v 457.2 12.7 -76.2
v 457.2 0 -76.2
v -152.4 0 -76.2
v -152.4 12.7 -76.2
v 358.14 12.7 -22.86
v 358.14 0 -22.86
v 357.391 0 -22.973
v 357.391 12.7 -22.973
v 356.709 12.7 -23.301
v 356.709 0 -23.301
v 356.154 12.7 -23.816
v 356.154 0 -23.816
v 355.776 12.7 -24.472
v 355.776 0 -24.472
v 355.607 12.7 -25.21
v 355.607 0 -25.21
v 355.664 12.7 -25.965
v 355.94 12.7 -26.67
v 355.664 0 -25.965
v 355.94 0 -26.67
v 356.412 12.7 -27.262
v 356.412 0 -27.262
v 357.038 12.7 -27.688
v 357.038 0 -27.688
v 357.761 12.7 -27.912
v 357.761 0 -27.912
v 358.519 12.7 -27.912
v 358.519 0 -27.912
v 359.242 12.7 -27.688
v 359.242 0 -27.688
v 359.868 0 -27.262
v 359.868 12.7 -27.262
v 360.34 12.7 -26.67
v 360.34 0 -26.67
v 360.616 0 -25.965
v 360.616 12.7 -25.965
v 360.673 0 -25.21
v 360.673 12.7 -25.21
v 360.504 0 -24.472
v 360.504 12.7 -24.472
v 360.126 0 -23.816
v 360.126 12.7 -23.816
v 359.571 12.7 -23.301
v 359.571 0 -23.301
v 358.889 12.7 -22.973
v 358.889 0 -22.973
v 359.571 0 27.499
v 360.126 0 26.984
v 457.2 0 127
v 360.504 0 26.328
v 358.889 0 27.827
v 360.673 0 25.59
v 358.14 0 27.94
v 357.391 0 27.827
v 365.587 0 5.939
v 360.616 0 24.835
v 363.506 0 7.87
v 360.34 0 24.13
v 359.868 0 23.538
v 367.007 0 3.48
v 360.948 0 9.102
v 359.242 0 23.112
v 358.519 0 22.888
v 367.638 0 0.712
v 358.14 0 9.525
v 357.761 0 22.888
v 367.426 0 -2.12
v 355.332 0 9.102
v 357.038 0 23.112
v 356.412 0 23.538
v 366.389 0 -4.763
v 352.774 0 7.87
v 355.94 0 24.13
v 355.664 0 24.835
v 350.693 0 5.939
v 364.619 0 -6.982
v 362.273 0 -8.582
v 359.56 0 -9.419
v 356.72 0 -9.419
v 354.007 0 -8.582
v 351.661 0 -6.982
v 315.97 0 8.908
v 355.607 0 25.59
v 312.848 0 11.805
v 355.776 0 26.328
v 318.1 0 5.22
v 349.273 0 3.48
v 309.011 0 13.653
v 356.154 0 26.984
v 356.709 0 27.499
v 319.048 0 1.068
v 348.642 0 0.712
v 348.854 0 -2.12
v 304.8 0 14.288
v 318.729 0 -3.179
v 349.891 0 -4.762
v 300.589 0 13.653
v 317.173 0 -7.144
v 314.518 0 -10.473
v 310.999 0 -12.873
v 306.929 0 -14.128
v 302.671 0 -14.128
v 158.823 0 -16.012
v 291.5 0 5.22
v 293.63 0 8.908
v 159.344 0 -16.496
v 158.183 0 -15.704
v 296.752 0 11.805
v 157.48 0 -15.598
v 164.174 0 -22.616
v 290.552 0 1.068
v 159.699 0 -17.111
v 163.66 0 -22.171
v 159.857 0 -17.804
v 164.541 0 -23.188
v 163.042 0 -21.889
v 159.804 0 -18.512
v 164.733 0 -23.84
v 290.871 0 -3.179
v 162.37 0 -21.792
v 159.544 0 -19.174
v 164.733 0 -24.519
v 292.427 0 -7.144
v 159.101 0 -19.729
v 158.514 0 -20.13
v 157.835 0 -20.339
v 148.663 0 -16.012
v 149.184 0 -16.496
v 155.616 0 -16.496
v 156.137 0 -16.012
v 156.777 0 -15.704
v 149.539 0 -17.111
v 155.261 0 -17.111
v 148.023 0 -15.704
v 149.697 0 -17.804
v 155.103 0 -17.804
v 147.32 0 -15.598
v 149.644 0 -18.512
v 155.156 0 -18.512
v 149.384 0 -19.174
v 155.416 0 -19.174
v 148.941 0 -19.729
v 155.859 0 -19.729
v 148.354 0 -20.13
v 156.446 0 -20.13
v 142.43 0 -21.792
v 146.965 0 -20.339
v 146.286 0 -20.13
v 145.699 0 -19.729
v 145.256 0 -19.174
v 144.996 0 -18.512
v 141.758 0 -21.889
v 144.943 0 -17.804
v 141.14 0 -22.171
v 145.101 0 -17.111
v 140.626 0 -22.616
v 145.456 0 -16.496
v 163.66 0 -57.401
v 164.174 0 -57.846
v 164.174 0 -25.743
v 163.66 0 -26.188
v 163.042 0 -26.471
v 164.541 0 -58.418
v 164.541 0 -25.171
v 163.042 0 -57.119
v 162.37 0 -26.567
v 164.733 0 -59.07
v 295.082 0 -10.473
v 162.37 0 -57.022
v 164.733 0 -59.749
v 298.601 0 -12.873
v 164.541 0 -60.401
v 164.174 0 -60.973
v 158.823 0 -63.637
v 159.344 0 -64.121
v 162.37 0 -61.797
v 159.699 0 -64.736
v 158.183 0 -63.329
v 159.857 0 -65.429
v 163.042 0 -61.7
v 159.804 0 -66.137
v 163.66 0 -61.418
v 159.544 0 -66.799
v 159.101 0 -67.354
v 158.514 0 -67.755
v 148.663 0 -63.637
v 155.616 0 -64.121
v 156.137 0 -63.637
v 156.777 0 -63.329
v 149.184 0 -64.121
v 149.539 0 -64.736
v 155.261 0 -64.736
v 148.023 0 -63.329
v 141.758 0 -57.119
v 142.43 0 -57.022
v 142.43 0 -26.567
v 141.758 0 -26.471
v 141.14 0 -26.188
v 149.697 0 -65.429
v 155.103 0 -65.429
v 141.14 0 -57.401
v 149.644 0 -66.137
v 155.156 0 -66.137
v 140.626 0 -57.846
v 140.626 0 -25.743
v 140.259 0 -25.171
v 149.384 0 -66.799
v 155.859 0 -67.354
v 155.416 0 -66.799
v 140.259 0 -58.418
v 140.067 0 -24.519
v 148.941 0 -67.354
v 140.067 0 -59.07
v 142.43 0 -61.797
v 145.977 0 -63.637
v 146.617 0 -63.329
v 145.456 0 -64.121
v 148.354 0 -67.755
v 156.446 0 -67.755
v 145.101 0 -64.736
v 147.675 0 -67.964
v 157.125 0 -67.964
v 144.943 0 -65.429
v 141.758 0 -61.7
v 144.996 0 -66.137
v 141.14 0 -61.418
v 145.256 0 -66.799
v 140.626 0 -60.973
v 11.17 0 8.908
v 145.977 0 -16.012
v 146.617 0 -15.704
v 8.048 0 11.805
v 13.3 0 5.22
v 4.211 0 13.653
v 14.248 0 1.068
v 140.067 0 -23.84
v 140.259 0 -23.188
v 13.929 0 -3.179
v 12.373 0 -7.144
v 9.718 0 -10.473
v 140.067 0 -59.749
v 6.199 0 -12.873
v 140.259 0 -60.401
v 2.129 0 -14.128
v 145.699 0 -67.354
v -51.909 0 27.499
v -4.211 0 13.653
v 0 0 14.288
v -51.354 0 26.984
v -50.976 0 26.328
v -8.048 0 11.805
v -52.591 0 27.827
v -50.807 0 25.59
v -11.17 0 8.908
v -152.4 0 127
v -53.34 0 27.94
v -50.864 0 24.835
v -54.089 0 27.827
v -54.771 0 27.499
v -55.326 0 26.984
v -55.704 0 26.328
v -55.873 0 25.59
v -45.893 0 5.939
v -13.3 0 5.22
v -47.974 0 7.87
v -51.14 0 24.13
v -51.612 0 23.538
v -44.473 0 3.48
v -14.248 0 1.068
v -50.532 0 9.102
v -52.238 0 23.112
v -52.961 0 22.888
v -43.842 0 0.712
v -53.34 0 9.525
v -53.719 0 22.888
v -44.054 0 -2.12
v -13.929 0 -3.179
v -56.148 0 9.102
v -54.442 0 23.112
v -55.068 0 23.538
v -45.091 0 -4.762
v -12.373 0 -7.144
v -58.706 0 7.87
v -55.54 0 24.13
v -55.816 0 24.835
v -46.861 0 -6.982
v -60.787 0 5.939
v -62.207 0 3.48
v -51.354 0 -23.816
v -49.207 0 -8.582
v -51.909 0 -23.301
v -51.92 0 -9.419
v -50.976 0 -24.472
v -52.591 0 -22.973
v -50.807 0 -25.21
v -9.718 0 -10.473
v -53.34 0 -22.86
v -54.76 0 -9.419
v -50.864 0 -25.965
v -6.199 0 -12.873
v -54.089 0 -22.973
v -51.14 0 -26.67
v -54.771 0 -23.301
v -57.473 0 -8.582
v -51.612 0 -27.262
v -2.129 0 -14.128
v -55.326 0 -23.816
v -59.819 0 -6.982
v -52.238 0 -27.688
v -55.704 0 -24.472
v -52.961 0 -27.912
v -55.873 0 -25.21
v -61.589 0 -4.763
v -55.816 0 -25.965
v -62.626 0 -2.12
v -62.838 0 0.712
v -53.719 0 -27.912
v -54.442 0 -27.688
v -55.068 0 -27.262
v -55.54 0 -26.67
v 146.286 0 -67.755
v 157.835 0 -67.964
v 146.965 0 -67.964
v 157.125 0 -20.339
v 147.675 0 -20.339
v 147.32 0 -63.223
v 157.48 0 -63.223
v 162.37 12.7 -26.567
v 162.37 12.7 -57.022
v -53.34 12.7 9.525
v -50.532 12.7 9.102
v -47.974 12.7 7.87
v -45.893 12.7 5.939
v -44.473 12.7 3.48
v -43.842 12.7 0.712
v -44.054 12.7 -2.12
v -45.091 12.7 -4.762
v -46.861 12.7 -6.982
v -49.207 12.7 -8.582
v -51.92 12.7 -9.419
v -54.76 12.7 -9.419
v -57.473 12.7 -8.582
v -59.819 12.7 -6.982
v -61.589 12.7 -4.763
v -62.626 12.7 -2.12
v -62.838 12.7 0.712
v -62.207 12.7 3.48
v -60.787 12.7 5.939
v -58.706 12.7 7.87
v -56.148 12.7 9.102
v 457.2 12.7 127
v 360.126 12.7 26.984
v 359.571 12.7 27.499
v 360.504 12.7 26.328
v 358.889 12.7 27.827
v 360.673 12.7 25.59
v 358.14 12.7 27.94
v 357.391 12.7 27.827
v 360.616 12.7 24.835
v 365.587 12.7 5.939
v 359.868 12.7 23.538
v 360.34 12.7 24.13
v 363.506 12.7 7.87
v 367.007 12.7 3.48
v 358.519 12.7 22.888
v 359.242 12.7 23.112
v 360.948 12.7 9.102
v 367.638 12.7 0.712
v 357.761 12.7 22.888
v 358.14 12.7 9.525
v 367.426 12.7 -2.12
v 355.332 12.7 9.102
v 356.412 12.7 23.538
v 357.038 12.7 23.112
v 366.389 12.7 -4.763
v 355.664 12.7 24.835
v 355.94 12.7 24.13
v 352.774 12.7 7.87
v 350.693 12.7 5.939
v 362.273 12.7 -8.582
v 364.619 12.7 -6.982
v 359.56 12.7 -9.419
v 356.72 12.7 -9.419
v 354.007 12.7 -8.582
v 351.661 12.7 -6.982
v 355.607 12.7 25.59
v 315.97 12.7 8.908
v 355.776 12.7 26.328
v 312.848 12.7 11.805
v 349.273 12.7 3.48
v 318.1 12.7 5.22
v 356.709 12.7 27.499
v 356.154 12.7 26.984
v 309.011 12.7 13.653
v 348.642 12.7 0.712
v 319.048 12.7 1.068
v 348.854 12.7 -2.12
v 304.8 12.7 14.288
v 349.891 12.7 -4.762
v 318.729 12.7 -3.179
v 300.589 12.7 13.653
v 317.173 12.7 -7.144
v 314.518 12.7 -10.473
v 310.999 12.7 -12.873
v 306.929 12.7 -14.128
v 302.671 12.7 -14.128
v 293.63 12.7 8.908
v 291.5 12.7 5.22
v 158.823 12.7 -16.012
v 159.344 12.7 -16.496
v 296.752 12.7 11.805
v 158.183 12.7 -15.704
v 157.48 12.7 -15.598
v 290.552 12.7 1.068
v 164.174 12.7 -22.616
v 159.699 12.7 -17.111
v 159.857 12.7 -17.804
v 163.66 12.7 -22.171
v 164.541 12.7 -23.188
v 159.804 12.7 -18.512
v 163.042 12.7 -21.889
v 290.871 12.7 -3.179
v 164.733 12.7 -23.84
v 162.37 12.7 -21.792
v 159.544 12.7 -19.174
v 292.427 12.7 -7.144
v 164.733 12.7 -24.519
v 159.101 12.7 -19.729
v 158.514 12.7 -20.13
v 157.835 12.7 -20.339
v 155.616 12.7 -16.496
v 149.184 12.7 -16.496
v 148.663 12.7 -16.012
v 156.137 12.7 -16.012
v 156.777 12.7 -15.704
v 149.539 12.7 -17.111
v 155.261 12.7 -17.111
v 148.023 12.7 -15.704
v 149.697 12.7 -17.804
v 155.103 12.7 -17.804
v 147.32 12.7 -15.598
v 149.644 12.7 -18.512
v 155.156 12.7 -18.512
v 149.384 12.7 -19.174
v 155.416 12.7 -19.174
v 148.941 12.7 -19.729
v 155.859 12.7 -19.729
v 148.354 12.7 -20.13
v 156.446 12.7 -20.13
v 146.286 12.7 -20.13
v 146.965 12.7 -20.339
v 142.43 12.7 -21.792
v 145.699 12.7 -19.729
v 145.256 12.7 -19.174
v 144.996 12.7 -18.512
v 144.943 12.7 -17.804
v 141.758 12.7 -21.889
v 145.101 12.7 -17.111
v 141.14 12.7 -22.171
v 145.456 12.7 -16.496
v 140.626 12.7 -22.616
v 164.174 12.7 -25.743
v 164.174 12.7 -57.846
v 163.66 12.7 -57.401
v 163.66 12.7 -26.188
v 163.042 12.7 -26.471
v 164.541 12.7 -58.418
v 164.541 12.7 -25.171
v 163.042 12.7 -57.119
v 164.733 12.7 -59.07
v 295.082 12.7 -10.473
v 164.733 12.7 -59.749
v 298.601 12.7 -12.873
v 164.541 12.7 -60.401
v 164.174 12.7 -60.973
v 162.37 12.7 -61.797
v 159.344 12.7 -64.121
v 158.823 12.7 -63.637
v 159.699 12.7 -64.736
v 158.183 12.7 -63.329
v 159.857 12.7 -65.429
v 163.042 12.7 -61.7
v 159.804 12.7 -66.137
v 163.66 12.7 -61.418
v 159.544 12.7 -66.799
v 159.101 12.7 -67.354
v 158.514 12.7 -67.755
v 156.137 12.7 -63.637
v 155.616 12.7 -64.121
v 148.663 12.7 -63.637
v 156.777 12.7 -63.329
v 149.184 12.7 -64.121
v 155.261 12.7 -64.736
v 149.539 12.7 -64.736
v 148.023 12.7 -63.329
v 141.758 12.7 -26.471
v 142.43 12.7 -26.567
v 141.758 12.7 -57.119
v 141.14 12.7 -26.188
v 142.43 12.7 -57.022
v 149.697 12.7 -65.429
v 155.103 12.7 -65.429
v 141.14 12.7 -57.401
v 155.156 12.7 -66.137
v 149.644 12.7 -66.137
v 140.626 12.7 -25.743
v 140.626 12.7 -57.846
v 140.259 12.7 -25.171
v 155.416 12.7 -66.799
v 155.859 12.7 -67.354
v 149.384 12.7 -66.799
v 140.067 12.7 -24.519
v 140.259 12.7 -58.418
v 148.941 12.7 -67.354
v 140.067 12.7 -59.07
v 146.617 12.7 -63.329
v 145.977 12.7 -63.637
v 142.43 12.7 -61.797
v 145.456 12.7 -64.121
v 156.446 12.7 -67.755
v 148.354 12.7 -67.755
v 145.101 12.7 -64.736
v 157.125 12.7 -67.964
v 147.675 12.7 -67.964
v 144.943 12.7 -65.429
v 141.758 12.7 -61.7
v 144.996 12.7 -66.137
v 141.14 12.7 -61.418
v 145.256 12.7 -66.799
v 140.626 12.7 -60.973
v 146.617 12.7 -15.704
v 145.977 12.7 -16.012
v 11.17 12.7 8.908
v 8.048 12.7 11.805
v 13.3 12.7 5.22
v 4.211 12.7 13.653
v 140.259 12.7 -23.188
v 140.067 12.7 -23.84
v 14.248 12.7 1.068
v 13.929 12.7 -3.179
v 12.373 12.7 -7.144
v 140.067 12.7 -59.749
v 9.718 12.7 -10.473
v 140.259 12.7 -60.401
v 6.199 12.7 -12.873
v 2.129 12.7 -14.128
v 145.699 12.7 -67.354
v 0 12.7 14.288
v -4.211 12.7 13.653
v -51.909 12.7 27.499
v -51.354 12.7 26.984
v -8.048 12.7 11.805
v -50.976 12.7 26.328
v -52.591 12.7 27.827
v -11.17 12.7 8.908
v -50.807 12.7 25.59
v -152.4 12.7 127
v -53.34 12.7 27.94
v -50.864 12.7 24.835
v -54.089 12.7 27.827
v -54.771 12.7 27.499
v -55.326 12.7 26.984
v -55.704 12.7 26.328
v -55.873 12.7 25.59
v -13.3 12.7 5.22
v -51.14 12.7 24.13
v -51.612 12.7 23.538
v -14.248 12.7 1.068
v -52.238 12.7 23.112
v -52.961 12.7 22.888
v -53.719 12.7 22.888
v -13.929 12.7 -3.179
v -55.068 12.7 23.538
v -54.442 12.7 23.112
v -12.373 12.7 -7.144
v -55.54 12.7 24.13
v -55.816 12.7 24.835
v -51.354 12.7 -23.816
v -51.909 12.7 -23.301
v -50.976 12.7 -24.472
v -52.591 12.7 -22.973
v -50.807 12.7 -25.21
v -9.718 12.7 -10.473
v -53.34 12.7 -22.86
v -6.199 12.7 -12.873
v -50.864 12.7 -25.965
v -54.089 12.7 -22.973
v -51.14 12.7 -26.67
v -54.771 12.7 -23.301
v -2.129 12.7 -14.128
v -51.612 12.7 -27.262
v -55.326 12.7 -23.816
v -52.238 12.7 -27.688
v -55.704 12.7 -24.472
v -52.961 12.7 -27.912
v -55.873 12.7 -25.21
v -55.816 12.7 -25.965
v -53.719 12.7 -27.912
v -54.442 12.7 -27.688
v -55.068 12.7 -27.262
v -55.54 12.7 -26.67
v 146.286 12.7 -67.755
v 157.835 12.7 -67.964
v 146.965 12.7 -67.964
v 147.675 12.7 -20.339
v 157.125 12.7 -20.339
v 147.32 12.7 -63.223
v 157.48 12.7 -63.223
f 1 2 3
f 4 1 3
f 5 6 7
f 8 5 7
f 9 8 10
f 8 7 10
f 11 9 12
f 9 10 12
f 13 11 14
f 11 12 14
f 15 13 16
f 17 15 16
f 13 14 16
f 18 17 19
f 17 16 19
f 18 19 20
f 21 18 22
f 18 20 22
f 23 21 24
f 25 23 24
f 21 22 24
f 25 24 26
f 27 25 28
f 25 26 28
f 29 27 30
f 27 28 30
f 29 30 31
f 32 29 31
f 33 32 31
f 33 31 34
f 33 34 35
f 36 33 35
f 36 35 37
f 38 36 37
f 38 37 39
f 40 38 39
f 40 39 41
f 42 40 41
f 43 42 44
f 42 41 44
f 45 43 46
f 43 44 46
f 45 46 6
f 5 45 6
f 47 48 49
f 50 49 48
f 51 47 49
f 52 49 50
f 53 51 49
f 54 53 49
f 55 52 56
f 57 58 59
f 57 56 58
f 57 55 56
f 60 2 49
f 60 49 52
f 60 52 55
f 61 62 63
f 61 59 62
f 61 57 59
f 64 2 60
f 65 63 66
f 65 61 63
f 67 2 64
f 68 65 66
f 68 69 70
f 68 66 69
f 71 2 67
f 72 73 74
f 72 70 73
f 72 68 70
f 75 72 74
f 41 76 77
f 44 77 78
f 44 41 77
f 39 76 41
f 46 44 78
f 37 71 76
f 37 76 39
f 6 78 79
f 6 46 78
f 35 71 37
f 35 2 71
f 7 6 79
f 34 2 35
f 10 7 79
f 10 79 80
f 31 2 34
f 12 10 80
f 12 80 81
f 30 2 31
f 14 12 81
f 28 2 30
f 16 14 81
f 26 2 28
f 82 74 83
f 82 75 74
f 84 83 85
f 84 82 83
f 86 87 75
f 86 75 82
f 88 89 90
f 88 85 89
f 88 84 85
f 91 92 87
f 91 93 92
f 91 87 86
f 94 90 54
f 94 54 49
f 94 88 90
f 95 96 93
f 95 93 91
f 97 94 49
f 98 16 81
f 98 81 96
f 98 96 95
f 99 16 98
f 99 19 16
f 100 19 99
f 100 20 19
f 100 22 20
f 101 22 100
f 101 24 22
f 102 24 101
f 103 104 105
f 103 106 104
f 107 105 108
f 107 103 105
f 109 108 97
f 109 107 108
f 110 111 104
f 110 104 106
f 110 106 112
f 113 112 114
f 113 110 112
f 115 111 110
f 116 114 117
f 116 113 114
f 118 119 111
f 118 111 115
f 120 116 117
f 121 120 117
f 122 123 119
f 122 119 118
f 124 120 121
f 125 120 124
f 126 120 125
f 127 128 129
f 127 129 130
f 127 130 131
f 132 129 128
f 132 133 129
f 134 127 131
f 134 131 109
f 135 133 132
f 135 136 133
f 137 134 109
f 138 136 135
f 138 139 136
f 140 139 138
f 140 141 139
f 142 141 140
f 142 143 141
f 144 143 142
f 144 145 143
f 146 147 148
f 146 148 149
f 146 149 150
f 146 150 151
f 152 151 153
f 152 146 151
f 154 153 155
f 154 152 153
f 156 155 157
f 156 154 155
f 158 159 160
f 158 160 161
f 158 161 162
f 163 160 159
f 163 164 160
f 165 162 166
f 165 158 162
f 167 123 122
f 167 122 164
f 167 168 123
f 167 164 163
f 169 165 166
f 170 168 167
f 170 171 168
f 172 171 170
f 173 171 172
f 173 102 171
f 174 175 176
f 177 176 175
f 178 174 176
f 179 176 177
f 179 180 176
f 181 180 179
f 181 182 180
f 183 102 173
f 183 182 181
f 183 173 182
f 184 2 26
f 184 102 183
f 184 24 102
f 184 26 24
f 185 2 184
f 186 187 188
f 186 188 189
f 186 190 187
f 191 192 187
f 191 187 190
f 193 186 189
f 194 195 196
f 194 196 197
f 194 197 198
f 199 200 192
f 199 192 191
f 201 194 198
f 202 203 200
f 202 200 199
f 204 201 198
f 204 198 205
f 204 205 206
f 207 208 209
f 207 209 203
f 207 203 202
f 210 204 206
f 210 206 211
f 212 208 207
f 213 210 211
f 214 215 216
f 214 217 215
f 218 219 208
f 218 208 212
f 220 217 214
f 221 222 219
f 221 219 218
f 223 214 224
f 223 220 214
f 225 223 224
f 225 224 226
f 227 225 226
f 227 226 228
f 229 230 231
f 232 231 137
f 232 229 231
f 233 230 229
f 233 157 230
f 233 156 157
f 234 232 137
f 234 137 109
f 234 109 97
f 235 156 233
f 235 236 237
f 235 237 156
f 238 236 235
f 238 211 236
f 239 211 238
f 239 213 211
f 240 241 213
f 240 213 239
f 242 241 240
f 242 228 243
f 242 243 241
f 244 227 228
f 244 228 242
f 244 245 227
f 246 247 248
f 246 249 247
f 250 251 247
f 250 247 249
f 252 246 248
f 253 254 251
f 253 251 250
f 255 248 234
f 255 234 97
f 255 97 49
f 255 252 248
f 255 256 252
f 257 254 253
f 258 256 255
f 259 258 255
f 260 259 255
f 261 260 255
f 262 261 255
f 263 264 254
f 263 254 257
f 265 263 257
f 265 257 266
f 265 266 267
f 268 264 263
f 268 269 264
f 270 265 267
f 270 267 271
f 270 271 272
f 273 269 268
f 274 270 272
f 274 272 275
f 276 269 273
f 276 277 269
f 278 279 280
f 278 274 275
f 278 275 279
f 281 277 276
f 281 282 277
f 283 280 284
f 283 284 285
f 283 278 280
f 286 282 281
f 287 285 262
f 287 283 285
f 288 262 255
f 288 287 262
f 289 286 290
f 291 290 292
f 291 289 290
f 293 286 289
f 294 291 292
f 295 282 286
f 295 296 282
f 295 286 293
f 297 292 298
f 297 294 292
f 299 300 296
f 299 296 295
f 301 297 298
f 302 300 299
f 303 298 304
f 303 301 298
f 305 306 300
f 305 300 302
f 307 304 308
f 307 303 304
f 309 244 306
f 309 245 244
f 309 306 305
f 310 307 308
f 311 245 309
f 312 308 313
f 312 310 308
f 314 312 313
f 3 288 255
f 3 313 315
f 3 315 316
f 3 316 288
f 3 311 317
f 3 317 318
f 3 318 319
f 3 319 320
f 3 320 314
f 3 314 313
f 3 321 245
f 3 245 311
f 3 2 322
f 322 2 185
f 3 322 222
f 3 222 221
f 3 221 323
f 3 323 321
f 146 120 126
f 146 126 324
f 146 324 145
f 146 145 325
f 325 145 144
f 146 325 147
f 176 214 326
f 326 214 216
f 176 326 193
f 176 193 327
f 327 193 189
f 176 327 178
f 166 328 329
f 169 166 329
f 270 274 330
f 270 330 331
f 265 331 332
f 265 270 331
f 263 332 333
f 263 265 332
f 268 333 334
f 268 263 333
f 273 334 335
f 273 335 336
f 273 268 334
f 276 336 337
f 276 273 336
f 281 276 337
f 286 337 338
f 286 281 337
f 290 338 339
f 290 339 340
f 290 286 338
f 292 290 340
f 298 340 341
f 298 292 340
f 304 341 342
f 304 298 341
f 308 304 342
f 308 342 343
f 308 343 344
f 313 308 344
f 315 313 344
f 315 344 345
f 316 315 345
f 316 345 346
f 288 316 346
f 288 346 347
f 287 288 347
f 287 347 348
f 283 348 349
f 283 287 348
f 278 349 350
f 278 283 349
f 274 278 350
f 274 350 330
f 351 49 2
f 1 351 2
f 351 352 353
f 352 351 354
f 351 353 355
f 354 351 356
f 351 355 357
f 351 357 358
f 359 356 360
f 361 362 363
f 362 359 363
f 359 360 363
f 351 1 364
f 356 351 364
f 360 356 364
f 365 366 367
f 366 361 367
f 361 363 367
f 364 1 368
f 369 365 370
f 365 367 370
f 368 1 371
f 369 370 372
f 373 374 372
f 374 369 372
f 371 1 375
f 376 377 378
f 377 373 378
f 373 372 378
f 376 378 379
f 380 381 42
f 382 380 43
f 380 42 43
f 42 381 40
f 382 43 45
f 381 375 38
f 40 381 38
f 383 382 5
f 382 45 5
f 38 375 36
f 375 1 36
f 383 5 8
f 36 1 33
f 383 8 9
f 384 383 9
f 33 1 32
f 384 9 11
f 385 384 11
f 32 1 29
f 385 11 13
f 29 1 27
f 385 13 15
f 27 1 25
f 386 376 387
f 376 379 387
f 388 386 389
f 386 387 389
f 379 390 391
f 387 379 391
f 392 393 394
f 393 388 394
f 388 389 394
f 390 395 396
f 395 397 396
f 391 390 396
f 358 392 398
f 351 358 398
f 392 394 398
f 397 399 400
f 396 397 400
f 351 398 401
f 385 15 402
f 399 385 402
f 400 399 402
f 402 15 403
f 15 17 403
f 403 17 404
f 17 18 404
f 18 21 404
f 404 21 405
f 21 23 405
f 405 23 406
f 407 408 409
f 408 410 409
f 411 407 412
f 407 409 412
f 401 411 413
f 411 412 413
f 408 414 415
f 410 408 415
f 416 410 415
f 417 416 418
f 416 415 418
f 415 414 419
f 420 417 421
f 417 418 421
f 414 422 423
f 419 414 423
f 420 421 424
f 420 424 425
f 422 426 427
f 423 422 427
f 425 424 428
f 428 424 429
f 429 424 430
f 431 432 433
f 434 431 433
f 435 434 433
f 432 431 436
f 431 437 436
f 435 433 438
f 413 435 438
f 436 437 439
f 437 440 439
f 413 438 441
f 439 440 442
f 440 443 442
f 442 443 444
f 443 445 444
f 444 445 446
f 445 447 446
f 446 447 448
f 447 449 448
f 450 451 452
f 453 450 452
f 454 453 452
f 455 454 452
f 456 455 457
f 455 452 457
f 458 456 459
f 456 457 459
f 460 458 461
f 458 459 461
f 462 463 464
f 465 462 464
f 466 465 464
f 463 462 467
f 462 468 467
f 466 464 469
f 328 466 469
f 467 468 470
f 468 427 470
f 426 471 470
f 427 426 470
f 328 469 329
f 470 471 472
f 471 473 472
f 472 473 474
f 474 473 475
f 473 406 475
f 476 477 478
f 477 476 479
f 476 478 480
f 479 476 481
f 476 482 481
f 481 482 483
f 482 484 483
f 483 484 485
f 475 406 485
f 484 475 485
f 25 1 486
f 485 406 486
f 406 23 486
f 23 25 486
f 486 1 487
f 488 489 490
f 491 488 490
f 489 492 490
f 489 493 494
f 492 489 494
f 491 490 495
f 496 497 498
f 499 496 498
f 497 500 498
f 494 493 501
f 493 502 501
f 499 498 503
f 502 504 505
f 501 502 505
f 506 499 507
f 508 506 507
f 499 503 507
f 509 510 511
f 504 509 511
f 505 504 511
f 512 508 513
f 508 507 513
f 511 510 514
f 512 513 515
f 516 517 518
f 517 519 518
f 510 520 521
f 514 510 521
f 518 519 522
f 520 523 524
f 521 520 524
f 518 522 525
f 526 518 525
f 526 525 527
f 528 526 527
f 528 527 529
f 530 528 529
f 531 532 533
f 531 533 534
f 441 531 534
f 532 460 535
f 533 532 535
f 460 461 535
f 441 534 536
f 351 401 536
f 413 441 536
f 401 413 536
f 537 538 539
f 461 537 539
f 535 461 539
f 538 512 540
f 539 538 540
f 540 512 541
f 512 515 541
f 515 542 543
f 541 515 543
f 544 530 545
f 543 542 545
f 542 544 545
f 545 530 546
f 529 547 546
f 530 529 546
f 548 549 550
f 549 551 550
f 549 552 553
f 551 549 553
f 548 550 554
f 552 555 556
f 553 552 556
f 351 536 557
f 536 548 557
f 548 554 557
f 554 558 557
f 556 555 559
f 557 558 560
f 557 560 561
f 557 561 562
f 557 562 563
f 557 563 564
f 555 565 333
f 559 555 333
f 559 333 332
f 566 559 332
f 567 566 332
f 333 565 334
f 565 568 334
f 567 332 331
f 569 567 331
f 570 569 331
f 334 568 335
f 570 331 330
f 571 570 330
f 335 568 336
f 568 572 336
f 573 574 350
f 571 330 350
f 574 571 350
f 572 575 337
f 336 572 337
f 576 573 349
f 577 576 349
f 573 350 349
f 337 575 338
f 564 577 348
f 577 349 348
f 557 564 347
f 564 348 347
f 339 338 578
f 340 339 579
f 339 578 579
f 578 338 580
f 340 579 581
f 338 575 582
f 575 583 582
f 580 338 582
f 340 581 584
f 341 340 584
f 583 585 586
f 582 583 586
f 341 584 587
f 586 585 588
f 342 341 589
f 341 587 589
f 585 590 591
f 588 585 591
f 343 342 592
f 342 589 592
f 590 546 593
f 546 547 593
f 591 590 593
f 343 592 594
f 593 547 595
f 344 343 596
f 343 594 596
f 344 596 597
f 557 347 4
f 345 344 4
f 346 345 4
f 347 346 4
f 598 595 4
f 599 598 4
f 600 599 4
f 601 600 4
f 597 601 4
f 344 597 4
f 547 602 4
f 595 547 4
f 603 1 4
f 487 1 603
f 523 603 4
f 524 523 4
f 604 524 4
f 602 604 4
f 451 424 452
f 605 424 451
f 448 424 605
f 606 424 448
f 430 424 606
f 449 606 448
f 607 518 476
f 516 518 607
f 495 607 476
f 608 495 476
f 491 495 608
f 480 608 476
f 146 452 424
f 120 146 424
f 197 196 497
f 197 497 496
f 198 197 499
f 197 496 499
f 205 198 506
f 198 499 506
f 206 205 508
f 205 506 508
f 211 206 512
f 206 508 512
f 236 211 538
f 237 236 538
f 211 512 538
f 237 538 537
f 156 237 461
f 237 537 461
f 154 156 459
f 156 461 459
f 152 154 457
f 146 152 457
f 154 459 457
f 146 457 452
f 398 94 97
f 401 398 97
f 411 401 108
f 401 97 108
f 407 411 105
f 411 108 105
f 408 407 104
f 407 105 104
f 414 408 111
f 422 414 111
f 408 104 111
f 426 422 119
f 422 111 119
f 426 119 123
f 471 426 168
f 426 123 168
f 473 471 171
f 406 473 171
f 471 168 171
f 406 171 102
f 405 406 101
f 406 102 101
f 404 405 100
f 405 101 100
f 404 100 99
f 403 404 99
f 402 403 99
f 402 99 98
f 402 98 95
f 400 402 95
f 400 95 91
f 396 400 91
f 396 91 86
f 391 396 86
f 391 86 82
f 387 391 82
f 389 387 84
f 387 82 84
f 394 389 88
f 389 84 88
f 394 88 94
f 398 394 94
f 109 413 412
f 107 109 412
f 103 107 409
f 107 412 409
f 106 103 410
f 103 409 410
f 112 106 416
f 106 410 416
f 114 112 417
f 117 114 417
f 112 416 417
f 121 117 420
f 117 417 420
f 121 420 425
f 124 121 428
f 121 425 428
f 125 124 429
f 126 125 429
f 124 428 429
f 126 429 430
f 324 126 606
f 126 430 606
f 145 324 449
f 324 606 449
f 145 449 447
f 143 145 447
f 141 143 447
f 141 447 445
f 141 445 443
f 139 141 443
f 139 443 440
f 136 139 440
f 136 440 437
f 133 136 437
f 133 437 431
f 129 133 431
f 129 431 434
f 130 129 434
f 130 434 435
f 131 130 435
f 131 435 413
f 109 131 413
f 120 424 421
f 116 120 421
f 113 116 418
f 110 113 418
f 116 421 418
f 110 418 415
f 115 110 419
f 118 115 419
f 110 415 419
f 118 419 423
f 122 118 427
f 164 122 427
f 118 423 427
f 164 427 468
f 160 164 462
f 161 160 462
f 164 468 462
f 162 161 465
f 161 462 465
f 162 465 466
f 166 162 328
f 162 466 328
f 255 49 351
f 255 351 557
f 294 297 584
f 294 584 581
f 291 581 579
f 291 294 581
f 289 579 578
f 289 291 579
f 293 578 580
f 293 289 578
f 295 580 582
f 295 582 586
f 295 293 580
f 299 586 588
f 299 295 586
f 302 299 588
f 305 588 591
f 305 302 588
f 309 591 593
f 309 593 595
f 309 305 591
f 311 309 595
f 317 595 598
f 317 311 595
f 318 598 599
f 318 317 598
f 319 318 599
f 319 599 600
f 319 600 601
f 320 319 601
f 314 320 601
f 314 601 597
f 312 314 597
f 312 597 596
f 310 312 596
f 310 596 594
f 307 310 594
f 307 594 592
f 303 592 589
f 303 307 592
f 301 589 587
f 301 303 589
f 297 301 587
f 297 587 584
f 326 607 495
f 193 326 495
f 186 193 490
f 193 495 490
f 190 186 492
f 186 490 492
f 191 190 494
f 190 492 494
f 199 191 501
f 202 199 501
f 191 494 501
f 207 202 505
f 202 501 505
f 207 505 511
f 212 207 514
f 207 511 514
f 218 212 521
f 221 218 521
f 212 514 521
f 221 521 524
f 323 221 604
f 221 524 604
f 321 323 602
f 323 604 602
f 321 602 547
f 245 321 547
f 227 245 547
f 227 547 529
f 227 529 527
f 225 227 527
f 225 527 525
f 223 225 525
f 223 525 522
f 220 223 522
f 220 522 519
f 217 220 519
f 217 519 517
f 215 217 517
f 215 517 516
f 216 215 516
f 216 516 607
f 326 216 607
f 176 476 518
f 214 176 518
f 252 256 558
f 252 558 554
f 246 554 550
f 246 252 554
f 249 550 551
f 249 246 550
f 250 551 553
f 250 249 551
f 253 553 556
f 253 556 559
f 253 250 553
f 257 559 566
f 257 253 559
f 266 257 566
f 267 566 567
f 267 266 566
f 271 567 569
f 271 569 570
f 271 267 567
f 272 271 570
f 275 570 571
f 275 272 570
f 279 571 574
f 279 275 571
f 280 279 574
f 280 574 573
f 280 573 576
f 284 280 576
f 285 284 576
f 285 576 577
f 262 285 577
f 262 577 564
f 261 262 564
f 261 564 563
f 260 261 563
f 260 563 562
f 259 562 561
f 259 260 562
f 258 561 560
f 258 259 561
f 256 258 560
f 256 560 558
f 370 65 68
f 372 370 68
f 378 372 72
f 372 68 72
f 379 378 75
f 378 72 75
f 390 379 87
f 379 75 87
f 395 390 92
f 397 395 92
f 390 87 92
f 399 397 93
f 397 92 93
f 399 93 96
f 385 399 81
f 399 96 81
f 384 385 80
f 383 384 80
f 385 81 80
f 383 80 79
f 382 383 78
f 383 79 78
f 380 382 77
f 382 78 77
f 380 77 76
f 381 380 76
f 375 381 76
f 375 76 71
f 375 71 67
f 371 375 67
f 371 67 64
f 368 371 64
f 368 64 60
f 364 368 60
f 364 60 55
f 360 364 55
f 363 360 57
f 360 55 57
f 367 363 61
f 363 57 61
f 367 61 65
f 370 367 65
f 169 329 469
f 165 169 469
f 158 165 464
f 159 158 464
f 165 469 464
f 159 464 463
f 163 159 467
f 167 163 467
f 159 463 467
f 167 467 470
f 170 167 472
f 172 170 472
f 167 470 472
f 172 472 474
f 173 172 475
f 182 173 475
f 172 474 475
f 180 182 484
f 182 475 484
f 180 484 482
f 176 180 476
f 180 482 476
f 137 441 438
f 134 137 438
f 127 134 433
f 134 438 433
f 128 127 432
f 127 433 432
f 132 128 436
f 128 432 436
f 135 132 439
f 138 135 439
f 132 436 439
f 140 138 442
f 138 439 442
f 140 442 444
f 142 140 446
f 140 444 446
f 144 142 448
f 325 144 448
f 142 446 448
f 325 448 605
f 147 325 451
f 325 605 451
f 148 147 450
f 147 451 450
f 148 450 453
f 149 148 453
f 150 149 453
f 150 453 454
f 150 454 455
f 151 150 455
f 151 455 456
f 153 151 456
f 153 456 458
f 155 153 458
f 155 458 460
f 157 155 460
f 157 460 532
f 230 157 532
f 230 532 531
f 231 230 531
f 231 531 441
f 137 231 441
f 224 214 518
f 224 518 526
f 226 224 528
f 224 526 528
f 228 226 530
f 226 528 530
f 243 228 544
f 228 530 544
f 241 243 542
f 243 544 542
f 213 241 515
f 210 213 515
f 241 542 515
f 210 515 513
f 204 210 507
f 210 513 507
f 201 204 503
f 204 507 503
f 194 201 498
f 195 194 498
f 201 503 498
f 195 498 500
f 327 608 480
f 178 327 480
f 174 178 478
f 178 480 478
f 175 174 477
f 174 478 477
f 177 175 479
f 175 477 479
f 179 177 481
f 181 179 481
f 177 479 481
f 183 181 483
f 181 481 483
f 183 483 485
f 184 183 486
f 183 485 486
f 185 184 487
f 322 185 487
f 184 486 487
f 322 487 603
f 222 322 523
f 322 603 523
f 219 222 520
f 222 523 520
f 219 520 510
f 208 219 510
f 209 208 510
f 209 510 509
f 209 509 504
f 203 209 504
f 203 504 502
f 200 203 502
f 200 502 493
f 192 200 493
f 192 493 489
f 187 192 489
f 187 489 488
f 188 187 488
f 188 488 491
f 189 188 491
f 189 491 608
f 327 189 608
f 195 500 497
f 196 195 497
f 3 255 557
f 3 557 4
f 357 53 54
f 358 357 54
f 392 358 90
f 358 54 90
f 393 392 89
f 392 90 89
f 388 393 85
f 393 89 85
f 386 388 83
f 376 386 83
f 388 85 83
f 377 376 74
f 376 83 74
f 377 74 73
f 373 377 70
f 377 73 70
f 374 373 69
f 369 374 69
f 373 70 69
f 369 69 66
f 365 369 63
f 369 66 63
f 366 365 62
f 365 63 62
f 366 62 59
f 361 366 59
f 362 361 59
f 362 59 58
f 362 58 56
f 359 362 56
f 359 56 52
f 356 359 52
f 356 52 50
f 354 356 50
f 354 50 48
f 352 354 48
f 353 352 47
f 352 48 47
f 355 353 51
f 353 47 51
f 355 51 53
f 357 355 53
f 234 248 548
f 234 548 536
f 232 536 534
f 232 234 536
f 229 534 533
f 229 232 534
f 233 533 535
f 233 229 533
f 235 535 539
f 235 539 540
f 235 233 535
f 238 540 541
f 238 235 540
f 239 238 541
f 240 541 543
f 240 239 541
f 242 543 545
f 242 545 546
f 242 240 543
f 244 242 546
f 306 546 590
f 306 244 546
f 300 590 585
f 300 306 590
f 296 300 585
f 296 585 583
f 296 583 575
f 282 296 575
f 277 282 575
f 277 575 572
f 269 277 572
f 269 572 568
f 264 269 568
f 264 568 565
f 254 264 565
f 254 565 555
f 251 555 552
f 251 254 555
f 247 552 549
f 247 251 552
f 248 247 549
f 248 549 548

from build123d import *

# Parameters (mm, degrees)
SKETCH1_W           = 304.8
SKETCH1_H           = 203.2
SKETCH1_R           = 14.2875
SKETCH1_R_2         = 9.525
SKETCH1_R_3         = 2.54
BOSS_EXTRUDE1_DEPTH = 12.7
SKETCH5_R           = 2.38379
CUT_EXTRUDE2_DEPTH  = 475.681082412


with BuildPart() as part:
    # Sketch1 → Boss-Extrude1 (new body)
    with BuildSketch(Plane(origin=(0, 0, 0), x_dir=(1, 0, 0), z_dir=(0, 1, 0))):
        with Locations((0, -25.4)):
            Rectangle(SKETCH1_W, SKETCH1_H)
        with Locations(Location((0, 0, 0), (0, 0, 270))):
            Circle(SKETCH1_R, mode=Mode.SUBTRACT)
        with Locations(Location((-53.34, 0, 0), (0, 0, 270))):
            Circle(SKETCH1_R_2, mode=Mode.SUBTRACT)
        with Locations(Location((-53.34, 25.4, 0), (0, 0, 270))):
            Circle(SKETCH1_R_3, mode=Mode.SUBTRACT)
        with Locations(Location((-53.34, -25.4, 0), (0, 0, 270))):
            Circle(SKETCH1_R_3, mode=Mode.SUBTRACT)
    boss_extrude1 = extrude(amount=BOSS_EXTRUDE1_DEPTH)

    # Mirror1: Boss-Extrude1 across plane
    add(boss_extrude1.mirror(Plane(origin=(152.4, 12.7, -76.2), x_dir=(0, 0, 1), z_dir=(-1, 0, 0))))

    # Sketch5 → Cut-Extrude2 (cut, through all)
    with BuildSketch(Plane(origin=(0, 12.7, 0), x_dir=(1, 0, 0), z_dir=(0, 1, 0))):
        with Locations(Location((157.48, 65.607045243, 0), (0, 0, 270))):
            Circle(SKETCH5_R)
        with Locations(Location((147.32, 65.607045243, 0), (0, 0, 270))):
            Circle(SKETCH5_R)
        with Locations(Location((147.32, 17.982045243, 0), (0, 0, 270))):
            Circle(SKETCH5_R)
        with Locations(Location((157.48, 17.982045243, 0), (0, 0, 270))):
            Circle(SKETCH5_R)
        with BuildLine():
            Line((142.4305, 21.792045243), (162.3695, 21.792045243))
            ThreePointArc((162.3695, 21.792045243), (164.7571, 24.179645243), (162.3695, 26.567245243))
            Line((162.3695, 26.567245243), (162.3695, 57.021845243))
            ThreePointArc((162.3695, 57.021845243), (164.7571, 59.409445243), (162.3695, 61.797045243))
            Line((162.3695, 61.797045243), (142.4305, 61.797045243))
            ThreePointArc((142.4305, 61.797045243), (140.0429, 59.409445243), (142.4305, 57.021845243))
            Line((142.4305, 57.021845243), (142.4305, 26.567245243))
            ThreePointArc((142.4305, 26.567245243), (140.0429, 24.179645243), (142.4305, 21.792045243))
        make_face()
    extrude(amount=-CUT_EXTRUDE2_DEPTH, mode=Mode.SUBTRACT)


solid = part.part
